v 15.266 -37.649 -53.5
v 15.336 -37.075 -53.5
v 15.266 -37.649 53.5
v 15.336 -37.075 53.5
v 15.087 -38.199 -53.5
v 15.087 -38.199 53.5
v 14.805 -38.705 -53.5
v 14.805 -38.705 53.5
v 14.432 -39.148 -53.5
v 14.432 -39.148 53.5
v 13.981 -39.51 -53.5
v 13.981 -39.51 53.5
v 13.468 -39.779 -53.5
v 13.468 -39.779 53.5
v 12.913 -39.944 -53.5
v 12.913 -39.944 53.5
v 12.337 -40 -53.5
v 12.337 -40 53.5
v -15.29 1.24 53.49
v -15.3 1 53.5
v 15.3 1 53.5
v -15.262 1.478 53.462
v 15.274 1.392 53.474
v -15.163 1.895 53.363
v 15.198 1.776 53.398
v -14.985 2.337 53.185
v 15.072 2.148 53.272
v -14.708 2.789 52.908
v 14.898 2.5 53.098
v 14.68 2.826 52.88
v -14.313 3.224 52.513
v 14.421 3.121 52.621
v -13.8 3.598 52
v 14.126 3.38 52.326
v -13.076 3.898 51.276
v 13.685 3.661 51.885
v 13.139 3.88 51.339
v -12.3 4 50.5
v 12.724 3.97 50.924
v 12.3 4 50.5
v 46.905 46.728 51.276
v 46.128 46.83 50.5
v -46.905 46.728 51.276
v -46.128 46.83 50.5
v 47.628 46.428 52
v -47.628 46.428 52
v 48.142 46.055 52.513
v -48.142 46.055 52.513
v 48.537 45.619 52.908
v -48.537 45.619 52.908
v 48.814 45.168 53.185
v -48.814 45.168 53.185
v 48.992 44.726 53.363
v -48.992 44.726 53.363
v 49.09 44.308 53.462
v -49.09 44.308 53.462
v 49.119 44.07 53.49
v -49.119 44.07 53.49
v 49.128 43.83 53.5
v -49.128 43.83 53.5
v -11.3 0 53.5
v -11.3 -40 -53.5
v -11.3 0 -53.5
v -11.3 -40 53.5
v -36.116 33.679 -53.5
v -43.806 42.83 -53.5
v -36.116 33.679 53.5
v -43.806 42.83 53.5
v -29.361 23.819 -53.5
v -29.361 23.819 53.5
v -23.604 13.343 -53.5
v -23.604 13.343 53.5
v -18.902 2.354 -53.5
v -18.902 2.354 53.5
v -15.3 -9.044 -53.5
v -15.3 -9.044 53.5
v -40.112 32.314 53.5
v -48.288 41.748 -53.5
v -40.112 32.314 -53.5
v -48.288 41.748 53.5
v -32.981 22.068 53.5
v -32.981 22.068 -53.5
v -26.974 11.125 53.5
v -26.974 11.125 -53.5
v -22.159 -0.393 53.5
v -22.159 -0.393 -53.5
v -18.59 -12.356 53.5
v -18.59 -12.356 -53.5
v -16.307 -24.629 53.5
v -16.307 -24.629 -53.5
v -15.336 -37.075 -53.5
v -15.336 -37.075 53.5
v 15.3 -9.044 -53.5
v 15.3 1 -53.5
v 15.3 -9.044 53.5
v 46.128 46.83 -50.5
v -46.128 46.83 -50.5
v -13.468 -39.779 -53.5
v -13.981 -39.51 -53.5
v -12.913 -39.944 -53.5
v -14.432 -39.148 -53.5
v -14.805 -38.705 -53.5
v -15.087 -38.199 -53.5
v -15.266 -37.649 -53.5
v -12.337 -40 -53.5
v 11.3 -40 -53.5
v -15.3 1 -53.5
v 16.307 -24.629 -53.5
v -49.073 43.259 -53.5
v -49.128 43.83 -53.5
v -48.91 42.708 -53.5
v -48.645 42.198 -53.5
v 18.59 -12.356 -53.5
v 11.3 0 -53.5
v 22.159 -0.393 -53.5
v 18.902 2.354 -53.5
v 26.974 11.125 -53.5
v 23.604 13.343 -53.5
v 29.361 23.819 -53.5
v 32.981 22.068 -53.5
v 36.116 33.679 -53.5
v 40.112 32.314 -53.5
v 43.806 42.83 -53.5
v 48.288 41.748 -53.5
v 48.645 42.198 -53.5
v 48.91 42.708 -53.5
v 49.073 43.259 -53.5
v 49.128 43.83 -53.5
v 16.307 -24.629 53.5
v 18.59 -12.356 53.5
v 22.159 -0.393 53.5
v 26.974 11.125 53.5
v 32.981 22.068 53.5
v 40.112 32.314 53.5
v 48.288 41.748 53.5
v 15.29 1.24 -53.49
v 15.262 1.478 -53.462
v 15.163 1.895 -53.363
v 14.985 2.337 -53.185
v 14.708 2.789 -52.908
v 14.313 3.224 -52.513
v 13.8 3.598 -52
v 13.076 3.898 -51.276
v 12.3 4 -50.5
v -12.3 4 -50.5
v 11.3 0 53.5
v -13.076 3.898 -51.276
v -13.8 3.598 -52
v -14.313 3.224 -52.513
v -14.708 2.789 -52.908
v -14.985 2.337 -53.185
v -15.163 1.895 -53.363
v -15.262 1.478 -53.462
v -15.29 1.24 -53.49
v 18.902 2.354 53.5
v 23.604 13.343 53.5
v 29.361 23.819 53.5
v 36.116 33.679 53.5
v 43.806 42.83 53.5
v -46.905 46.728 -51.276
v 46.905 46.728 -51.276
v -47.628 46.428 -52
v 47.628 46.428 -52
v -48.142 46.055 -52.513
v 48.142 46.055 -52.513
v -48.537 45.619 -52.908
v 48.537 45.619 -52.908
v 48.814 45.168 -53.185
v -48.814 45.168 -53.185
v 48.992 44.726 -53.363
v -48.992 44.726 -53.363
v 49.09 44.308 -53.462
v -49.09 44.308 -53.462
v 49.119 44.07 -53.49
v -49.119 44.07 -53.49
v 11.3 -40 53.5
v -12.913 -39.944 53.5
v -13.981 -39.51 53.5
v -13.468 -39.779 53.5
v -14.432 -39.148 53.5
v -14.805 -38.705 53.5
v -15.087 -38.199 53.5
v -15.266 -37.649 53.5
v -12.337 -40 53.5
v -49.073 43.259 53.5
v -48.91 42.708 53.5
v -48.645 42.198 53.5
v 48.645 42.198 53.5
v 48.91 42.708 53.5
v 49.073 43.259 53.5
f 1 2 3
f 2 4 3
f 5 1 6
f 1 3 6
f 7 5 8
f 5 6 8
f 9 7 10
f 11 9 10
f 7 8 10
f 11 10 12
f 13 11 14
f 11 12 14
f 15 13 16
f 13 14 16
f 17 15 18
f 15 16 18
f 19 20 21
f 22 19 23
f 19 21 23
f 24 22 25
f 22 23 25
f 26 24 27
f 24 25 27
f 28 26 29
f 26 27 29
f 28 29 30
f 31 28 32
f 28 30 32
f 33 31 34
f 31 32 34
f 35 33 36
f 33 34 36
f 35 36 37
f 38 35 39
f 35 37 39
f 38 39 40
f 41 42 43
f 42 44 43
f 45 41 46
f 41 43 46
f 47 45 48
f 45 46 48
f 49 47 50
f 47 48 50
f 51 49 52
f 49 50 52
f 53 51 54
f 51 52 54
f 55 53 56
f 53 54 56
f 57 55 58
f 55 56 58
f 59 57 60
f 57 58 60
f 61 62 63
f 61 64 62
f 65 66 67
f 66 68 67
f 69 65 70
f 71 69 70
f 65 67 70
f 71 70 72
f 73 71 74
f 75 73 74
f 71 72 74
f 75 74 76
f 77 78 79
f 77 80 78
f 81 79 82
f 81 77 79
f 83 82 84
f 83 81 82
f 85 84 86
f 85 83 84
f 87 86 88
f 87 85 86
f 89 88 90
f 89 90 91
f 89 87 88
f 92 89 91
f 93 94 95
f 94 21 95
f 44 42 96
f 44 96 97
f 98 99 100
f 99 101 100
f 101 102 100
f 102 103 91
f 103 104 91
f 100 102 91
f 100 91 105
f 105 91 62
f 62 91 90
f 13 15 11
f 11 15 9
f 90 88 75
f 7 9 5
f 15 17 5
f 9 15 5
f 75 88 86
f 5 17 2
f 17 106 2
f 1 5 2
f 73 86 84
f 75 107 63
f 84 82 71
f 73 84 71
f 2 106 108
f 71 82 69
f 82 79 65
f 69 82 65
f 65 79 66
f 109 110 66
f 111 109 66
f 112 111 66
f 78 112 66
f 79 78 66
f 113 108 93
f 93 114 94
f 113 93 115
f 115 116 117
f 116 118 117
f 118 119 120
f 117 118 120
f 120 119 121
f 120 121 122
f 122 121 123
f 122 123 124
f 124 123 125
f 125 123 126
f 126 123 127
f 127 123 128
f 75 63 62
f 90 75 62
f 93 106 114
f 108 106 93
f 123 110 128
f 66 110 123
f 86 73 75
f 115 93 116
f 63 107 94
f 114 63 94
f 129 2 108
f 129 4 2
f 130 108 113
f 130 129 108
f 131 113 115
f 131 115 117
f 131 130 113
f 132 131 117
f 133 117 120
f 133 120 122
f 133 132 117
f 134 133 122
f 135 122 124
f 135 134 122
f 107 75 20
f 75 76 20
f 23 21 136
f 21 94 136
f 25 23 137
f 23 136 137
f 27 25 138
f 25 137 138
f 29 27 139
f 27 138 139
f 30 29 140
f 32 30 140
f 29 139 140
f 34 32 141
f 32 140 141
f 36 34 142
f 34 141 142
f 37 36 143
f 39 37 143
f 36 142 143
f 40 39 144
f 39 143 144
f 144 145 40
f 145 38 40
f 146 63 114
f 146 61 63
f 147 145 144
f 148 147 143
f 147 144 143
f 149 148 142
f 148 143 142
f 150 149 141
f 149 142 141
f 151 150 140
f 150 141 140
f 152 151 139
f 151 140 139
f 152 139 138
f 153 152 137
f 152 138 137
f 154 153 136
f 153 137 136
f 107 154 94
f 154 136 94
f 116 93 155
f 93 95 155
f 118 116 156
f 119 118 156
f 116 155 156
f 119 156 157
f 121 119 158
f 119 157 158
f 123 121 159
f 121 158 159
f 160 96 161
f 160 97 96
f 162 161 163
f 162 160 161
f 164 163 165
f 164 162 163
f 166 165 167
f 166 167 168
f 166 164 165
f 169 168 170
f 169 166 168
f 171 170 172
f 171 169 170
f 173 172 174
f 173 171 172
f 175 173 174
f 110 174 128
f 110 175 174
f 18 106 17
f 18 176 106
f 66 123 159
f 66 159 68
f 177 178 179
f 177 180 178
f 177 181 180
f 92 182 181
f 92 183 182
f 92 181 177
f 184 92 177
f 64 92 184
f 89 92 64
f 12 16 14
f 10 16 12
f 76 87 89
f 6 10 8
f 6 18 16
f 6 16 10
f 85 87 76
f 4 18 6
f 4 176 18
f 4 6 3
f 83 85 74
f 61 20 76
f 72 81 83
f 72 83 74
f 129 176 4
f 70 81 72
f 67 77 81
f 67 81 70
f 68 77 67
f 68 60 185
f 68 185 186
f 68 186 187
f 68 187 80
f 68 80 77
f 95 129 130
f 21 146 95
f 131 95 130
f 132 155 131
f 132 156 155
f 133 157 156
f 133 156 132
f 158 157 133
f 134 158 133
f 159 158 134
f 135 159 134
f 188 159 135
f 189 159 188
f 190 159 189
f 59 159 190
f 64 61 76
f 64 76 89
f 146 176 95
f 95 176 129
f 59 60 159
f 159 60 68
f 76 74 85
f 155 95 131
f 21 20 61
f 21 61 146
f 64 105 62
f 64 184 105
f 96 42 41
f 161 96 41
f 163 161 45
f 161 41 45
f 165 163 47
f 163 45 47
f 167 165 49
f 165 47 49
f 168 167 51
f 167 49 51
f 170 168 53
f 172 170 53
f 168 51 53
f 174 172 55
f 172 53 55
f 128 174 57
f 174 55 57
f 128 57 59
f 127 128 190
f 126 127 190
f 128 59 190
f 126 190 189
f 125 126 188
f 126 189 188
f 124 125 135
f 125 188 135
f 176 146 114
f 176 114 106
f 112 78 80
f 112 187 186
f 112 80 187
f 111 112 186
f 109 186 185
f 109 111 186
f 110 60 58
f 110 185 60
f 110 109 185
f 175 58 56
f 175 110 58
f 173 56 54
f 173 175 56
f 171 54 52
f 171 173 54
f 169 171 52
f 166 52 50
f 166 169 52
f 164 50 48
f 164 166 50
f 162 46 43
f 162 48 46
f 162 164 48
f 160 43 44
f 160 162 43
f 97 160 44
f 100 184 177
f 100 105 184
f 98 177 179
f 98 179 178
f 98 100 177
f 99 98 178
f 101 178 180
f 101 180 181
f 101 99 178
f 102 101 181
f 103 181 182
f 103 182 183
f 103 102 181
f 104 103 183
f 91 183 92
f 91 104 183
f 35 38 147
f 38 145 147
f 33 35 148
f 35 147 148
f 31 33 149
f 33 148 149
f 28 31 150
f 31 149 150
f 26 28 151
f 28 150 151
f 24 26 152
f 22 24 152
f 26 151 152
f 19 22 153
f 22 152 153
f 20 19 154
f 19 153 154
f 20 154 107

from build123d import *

# Parameters (mm, degrees)
BOSS_EXTRU_1_DEPTH = 53.5
CONG_1_R           = 3


with BuildPart() as part:
    # Esquisse1 → Boss.-Extru.1 (new body, symmetric)
    with BuildSketch(Plane.XY):
        with BuildLine():
            Line((-11.3, 0), (11.3, 0))
            Line((11.3, 0), (11.3, -40))
            Line((11.3, -40), (15.3, -40))
            ThreePointArc((15.3, -40), (25.272141163, 7.430887623), (53.5, 46.830388705))
            Line((53.5, 46.830388705), (-53.5, 46.830388705))
            ThreePointArc((-53.5, 46.830388705), (-25.272141163, 7.430887623), (-15.3, -40))
            Line((-15.3, -40), (-11.3, -40))
            Line((-11.3, -40), (-11.3, 0))
        make_face()
        with BuildLine():
            Line((43.806234565, 42.830388705), (-43.806234565, 42.830388705))
            ThreePointArc((-43.806234565, 42.830388705), (-26.353615228, 18.651434723), (-15.3, -9.043931817))
            Line((-15.3, -9.043931817), (-15.3, 4))
            Line((-15.3, 4), (15.3, 4))
            Line((15.3, 4), (15.3, -9.043931817))
            ThreePointArc((15.3, -9.043931817), (26.353615228, 18.651434723), (43.806234565, 42.830388705))
        make_face(mode=Mode.SUBTRACT)
    extrude(amount=BOSS_EXTRU_1_DEPTH, both=True)

    # Congé1
    cong_1_edges = [part.edges().sort_by_distance(p)[0] for p in [
        (0, 46.830388705, 53.5),
        (-15.3, -40, 0),
        (-53.5, 46.830388705, 0),
        (53.5, 46.830388705, 0),
        (15.3, -40, 0),
        (0, 46.830388705, -53.5),
        (0, 4, -53.5),
        (15.3, 4, 0),
        (-15.3, 4, 0),
        (0, 4, 53.5),
    ]]
    fillet(cong_1_edges, radius=CONG_1_R)


solid = part.part
